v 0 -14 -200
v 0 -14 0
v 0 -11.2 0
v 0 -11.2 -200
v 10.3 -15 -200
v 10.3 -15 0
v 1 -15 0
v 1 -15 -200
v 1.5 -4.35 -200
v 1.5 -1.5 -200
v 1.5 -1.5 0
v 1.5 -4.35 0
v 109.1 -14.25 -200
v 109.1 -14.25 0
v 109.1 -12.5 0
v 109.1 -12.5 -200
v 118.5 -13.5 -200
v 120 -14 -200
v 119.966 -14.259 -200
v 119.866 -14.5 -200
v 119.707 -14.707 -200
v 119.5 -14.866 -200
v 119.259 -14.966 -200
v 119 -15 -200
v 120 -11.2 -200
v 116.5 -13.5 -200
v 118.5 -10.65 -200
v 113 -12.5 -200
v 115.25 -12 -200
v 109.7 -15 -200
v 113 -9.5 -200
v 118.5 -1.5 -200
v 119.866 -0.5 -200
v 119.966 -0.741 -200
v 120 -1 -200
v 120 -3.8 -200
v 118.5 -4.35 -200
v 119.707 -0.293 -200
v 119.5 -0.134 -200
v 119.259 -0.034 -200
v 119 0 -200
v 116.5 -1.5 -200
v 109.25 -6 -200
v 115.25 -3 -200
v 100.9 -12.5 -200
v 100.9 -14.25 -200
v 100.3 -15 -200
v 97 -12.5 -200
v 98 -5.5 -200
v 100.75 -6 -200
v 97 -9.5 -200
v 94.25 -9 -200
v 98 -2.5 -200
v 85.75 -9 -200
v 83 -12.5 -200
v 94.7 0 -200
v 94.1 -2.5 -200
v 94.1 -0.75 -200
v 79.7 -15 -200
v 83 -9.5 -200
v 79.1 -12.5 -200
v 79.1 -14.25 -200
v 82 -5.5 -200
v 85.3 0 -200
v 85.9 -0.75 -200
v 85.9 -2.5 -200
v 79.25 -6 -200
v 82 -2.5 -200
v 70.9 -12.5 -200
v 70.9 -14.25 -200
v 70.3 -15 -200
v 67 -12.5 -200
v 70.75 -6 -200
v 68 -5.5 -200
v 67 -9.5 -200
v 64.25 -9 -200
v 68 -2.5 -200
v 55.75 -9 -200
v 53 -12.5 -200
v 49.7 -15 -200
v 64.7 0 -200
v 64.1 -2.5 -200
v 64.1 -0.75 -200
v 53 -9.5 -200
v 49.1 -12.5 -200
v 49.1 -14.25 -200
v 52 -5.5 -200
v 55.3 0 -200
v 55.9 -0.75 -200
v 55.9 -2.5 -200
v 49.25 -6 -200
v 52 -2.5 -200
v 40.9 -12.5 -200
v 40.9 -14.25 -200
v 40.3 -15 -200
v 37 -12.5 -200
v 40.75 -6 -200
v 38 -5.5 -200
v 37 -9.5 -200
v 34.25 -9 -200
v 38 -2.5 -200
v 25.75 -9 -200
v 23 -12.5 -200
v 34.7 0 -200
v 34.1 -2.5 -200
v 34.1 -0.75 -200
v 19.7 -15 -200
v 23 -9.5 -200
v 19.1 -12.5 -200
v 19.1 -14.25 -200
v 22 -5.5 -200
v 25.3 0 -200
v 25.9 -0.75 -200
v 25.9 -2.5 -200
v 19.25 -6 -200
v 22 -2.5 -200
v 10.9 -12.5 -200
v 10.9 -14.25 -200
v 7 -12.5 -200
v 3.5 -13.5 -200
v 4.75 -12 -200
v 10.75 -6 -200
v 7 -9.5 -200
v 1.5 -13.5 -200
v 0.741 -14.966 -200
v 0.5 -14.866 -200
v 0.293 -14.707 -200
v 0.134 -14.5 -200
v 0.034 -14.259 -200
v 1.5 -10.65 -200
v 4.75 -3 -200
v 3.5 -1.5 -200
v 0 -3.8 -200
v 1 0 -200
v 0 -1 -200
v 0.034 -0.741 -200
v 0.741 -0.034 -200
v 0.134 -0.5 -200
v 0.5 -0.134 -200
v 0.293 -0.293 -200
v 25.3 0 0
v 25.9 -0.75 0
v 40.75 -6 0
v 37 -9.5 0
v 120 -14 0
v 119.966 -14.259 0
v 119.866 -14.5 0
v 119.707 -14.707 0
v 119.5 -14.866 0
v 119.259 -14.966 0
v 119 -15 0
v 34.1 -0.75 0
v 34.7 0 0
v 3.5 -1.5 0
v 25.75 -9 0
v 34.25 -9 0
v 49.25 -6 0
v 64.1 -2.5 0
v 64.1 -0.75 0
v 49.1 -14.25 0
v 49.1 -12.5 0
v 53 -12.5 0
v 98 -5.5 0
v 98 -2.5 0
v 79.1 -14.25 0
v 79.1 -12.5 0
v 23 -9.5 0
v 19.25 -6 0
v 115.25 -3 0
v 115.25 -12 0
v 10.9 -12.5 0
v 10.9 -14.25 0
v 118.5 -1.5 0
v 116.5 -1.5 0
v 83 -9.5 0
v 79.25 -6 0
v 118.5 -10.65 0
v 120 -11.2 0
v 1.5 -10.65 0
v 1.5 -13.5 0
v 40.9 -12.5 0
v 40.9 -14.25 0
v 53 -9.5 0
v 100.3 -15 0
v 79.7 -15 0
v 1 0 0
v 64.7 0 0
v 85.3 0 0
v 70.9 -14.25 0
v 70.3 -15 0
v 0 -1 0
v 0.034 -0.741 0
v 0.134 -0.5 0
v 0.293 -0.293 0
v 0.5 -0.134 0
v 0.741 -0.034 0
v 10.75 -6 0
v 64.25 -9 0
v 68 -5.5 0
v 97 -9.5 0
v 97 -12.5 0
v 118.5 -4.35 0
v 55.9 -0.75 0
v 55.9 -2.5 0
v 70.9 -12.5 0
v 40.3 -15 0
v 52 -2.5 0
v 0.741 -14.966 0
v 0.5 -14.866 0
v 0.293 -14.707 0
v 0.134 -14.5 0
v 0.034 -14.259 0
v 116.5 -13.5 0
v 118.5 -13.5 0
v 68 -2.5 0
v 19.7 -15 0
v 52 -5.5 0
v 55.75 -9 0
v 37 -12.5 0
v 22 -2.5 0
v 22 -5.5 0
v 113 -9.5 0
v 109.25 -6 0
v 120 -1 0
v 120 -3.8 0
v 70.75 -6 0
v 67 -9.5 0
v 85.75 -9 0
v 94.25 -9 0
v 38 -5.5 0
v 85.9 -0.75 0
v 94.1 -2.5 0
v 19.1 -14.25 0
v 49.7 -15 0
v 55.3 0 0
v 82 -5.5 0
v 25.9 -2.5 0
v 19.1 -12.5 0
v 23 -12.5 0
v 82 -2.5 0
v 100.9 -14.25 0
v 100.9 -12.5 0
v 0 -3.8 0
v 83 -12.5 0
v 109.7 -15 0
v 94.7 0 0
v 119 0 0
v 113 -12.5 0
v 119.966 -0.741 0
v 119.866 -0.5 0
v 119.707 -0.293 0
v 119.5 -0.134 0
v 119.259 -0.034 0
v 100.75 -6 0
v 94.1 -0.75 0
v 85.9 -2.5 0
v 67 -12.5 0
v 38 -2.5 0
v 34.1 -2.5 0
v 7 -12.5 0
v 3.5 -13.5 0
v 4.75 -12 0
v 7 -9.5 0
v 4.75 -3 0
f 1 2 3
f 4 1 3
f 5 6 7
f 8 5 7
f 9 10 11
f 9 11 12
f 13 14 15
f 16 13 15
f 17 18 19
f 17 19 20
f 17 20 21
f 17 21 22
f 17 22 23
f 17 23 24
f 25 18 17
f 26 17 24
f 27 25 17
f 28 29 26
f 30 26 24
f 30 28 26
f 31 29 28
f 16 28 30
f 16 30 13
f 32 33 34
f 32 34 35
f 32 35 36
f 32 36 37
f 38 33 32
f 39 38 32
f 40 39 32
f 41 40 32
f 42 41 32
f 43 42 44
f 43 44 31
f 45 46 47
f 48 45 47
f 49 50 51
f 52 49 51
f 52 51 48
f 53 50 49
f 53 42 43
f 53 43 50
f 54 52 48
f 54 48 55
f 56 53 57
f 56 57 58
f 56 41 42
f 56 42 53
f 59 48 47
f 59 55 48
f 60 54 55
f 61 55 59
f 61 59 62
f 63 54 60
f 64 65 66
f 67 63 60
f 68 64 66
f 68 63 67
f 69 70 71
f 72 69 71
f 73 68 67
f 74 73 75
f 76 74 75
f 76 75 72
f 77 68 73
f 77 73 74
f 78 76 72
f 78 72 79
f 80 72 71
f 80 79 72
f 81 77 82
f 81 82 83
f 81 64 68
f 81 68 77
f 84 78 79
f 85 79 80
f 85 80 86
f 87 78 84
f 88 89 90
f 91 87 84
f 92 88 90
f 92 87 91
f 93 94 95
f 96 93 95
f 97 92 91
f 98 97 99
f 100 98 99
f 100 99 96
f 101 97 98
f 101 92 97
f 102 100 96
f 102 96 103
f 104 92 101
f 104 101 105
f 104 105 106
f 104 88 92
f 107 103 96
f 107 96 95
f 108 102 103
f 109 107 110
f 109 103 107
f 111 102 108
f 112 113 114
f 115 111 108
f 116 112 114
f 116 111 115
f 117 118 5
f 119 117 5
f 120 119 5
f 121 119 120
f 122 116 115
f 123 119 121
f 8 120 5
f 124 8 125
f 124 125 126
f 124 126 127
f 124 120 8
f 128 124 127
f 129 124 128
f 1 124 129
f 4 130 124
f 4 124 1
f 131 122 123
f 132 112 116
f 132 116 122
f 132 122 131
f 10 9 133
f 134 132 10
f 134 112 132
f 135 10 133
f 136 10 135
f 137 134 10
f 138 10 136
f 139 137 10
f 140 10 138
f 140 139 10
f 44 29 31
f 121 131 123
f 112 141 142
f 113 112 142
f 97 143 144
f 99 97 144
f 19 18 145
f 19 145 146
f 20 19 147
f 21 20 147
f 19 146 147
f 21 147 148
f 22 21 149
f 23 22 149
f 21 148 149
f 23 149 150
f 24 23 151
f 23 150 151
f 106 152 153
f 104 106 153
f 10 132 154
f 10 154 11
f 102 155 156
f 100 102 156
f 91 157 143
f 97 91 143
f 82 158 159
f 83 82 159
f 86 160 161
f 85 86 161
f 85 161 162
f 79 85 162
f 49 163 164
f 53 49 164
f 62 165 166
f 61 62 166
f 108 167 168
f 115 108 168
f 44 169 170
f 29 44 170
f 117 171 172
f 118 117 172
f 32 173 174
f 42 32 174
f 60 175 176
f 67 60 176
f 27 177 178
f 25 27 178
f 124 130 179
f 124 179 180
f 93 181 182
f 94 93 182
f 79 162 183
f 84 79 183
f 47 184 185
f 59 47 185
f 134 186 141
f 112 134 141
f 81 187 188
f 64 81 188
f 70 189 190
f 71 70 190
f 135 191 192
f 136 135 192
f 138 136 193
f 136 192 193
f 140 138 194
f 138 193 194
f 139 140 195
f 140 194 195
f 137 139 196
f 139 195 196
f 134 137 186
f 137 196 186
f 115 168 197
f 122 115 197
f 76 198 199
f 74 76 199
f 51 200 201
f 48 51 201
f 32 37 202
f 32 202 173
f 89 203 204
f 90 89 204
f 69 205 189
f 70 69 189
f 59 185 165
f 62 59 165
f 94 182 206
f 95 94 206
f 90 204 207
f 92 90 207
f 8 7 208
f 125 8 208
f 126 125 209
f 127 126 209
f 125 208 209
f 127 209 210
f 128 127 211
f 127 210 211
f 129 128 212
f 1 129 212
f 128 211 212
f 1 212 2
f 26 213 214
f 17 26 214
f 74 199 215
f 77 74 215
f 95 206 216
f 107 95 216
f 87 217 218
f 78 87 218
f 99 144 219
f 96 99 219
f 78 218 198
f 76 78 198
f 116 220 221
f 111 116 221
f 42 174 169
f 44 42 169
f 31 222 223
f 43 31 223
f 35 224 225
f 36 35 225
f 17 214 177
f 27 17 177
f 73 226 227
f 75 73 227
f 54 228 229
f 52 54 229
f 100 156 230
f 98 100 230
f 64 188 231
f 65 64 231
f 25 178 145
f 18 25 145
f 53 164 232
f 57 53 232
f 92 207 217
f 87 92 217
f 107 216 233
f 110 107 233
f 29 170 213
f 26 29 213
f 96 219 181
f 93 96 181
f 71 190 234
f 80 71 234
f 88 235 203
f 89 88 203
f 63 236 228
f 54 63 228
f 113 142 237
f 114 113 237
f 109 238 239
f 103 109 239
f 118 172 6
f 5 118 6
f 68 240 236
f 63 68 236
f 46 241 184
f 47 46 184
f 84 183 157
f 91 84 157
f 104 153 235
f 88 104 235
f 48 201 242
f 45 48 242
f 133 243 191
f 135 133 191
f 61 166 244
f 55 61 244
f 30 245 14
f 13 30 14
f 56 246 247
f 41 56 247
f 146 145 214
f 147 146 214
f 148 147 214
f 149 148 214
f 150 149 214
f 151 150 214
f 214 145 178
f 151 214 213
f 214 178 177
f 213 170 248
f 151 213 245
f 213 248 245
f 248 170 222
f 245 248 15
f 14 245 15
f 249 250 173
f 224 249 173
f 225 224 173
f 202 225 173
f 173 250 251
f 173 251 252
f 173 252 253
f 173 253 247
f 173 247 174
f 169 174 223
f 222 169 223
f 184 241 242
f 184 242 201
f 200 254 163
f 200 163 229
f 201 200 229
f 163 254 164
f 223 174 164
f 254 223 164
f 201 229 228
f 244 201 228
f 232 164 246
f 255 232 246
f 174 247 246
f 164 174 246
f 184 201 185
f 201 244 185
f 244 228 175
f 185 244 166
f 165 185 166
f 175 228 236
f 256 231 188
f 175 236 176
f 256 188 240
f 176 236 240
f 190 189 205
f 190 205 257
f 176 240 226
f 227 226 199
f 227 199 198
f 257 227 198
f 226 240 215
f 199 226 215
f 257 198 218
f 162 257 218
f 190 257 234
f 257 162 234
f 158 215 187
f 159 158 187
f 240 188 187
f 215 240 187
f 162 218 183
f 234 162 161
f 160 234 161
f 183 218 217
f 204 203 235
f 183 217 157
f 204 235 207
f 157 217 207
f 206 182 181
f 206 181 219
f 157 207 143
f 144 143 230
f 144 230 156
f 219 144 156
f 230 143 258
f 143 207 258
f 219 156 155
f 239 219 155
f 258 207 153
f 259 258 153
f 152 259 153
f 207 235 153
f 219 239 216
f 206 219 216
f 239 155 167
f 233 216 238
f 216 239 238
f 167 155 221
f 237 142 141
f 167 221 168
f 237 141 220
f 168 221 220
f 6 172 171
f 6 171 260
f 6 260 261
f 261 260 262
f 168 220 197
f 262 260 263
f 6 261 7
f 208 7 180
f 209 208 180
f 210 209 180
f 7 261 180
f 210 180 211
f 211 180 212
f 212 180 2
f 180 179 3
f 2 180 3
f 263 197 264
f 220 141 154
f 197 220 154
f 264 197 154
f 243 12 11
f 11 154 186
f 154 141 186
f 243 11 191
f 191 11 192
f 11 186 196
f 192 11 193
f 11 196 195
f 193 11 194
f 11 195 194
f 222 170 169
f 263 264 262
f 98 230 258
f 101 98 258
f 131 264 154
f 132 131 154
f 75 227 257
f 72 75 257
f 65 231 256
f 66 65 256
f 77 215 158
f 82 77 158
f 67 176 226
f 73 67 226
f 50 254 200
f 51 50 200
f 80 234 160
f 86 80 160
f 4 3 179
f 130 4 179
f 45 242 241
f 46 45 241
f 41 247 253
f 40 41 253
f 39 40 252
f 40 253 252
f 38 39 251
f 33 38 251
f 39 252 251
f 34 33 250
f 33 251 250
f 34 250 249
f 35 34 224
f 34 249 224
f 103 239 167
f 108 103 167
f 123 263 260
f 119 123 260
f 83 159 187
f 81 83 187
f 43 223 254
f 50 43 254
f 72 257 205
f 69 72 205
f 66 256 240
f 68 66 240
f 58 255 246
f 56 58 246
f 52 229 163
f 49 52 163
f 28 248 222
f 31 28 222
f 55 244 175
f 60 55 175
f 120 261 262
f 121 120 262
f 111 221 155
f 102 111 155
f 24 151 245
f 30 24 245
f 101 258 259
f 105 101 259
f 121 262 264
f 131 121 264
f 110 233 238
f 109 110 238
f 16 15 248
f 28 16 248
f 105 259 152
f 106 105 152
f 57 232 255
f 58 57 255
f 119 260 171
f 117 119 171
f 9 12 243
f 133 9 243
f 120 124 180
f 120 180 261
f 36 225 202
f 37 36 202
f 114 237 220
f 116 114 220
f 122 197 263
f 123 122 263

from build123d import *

# Parameters (mm, degrees)
BOSS_EXTRUDE1_DEPTH = 200


with BuildPart() as part:
    # Sketch1 → Boss-Extrude1 (new body)
    with BuildSketch(Plane.XY):
        with BuildLine():
            Line((0, -3.8), (0, -1))
            ThreePointArc((0, -1), (0.292893219, -0.292893219), (1, 0))
            Line((1, 0), (15, 0))
            Line((15, 0), (23.02057349, 0))
            Line((23.02057349, 0), (25.3, 0))
            Line((25.3, 0), (25.9, -0.75))
            Line((25.9, -0.75), (25.9, -2.5))
            Line((25.9, -2.5), (22, -2.5))
            Line((22, -2.5), (22, -5.5))
            Line((22, -5.5), (25.75, -9))
            Line((25.75, -9), (30, -9))
            Line((30, -9), (34.25, -9))
            Line((34.25, -9), (38, -5.5))
            Line((38, -5.5), (38, -2.5))
            Line((38, -2.5), (34.1, -2.5))
            Line((34.1, -2.5), (34.1, -0.75))
            Line((34.1, -0.75), (34.7, 0))
            Line((34.7, 0), (55.3, 0))
            Line((55.3, 0), (55.9, -0.75))
            Line((55.9, -0.75), (55.9, -2.5))
            Line((55.9, -2.5), (52, -2.5))
            Line((52, -2.5), (52, -5.5))
            Line((52, -5.5), (55.75, -9))
            Line((55.75, -9), (60, -9))
            Line((60, -9), (64.25, -9))
            Line((64.25, -9), (68, -5.5))
            Line((68, -5.5), (68, -2.5))
            Line((68, -2.5), (64.1, -2.5))
            Line((64.1, -2.5), (64.1, -0.75))
            Line((64.1, -0.75), (64.7, 0))
            Line((64.7, 0), (85.3, 0))
            Line((85.3, 0), (85.9, -0.75))
            Line((85.9, -0.75), (85.9, -2.5))
            Line((85.9, -2.5), (82, -2.5))
            Line((82, -2.5), (82, -5.5))
            Line((82, -5.5), (85.75, -9))
            Line((85.75, -9), (90, -9))
            Line((90, -9), (94.25, -9))
            Line((94.25, -9), (98, -5.5))
            Line((98, -5.5), (98, -2.5))
            Line((98, -2.5), (94.1, -2.5))
            Line((94.1, -2.5), (94.1, -0.75))
            Line((94.1, -0.75), (94.7, 0))
            Line((94.7, 0), (95.680089514, 0))
            Line((95.680089514, 0), (119, 0))
            ThreePointArc((119, 0), (119.707106781, -0.292893219), (120, -1))
            Line((120, -1), (120, -3.8))
            Line((120, -3.8), (118.5, -4.35))
            Line((118.5, -4.35), (118.5, -1.5))
            Line((118.5, -1.5), (116.5, -1.5))
            Line((116.5, -1.5), (115.25, -3))
            Line((115.25, -3), (115.25, -12))
            Line((115.25, -12), (116.5, -13.5))
            Line((116.5, -13.5), (118.5, -13.5))
            Line((118.5, -13.5), (118.5, -10.65))
            Line((118.5, -10.65), (120, -11.2))
            Line((120, -11.2), (120, -14))
            ThreePointArc((120, -14), (119.707106781, -14.707106781), (119, -15))
            Line((119, -15), (109.7, -15))
            Line((109.7, -15), (109.1, -14.25))
            Line((109.1, -14.25), (109.1, -12.5))
            Line((109.1, -12.5), (113, -12.5))
            Line((113, -12.5), (113, -9.5))
            Line((113, -9.5), (109.25, -6))
            Line((109.25, -6), (105, -6))
            Line((105, -6), (100.75, -6))
            Line((100.75, -6), (97, -9.5))
            Line((97, -9.5), (97, -12.5))
            Line((97, -12.5), (100.9, -12.5))
            Line((100.9, -12.5), (100.9, -14.25))
            Line((100.9, -14.25), (100.3, -15))
            Line((100.3, -15), (79.7, -15))
            Line((79.7, -15), (79.1, -14.25))
            Line((79.1, -14.25), (79.1, -12.5))
            Line((79.1, -12.5), (83, -12.5))
            Line((83, -12.5), (83, -9.5))
            Line((83, -9.5), (79.25, -6))
            Line((79.25, -6), (75, -6))
            Line((75, -6), (70.75, -6))
            Line((70.75, -6), (67, -9.5))
            Line((67, -9.5), (67, -12.5))
            Line((67, -12.5), (70.9, -12.5))
            Line((70.9, -12.5), (70.9, -14.25))
            Line((70.9, -14.25), (70.3, -15))
            Line((70.3, -15), (49.7, -15))
            Line((49.7, -15), (49.1, -14.25))
            Line((49.1, -14.25), (49.1, -12.5))
            Line((49.1, -12.5), (53, -12.5))
            Line((53, -12.5), (53, -9.5))
            Line((53, -9.5), (49.25, -6))
            Line((49.25, -6), (45, -6))
            Line((45, -6), (40.75, -6))
            Line((40.75, -6), (37, -9.5))
            Line((37, -9.5), (37, -12.5))
            Line((37, -12.5), (40.9, -12.5))
            Line((40.9, -12.5), (40.9, -14.25))
            Line((40.9, -14.25), (40.3, -15))
            Line((40.3, -15), (19.7, -15))
            Line((19.7, -15), (19.1, -14.25))
            Line((19.1, -14.25), (19.1, -12.5))
            Line((19.1, -12.5), (23, -12.5))
            Line((23, -12.5), (23, -9.5))
            Line((23, -9.5), (19.25, -6))
            Line((19.25, -6), (15, -6))
            Line((15, -6), (10.75, -6))
            Line((10.75, -6), (7, -9.5))
            Line((7, -9.5), (7, -12.5))
            Line((7, -12.5), (10.9, -12.5))
            Line((10.9, -12.5), (10.9, -14.25))
            Line((10.9, -14.25), (10.3, -15))
            Line((10.3, -15), (1, -15))
            ThreePointArc((1, -15), (0.292893219, -14.707106781), (0, -14))
            Line((0, -14), (0, -11.2))
            Line((0, -11.2), (1.5, -10.65))
            Line((1.5, -10.65), (1.5, -13.5))
            Line((1.5, -13.5), (3.5, -13.5))
            Line((3.5, -13.5), (4.75, -12))
            Line((4.75, -12), (4.75, -3))
            Line((4.75, -3), (3.5, -1.5))
            Line((3.5, -1.5), (1.5, -1.5))
            Line((1.5, -1.5), (1.5, -4.35))
            Line((1.5, -4.35), (0, -3.8))
        make_face()
    extrude(amount=-BOSS_EXTRUDE1_DEPTH)


solid = part.part
